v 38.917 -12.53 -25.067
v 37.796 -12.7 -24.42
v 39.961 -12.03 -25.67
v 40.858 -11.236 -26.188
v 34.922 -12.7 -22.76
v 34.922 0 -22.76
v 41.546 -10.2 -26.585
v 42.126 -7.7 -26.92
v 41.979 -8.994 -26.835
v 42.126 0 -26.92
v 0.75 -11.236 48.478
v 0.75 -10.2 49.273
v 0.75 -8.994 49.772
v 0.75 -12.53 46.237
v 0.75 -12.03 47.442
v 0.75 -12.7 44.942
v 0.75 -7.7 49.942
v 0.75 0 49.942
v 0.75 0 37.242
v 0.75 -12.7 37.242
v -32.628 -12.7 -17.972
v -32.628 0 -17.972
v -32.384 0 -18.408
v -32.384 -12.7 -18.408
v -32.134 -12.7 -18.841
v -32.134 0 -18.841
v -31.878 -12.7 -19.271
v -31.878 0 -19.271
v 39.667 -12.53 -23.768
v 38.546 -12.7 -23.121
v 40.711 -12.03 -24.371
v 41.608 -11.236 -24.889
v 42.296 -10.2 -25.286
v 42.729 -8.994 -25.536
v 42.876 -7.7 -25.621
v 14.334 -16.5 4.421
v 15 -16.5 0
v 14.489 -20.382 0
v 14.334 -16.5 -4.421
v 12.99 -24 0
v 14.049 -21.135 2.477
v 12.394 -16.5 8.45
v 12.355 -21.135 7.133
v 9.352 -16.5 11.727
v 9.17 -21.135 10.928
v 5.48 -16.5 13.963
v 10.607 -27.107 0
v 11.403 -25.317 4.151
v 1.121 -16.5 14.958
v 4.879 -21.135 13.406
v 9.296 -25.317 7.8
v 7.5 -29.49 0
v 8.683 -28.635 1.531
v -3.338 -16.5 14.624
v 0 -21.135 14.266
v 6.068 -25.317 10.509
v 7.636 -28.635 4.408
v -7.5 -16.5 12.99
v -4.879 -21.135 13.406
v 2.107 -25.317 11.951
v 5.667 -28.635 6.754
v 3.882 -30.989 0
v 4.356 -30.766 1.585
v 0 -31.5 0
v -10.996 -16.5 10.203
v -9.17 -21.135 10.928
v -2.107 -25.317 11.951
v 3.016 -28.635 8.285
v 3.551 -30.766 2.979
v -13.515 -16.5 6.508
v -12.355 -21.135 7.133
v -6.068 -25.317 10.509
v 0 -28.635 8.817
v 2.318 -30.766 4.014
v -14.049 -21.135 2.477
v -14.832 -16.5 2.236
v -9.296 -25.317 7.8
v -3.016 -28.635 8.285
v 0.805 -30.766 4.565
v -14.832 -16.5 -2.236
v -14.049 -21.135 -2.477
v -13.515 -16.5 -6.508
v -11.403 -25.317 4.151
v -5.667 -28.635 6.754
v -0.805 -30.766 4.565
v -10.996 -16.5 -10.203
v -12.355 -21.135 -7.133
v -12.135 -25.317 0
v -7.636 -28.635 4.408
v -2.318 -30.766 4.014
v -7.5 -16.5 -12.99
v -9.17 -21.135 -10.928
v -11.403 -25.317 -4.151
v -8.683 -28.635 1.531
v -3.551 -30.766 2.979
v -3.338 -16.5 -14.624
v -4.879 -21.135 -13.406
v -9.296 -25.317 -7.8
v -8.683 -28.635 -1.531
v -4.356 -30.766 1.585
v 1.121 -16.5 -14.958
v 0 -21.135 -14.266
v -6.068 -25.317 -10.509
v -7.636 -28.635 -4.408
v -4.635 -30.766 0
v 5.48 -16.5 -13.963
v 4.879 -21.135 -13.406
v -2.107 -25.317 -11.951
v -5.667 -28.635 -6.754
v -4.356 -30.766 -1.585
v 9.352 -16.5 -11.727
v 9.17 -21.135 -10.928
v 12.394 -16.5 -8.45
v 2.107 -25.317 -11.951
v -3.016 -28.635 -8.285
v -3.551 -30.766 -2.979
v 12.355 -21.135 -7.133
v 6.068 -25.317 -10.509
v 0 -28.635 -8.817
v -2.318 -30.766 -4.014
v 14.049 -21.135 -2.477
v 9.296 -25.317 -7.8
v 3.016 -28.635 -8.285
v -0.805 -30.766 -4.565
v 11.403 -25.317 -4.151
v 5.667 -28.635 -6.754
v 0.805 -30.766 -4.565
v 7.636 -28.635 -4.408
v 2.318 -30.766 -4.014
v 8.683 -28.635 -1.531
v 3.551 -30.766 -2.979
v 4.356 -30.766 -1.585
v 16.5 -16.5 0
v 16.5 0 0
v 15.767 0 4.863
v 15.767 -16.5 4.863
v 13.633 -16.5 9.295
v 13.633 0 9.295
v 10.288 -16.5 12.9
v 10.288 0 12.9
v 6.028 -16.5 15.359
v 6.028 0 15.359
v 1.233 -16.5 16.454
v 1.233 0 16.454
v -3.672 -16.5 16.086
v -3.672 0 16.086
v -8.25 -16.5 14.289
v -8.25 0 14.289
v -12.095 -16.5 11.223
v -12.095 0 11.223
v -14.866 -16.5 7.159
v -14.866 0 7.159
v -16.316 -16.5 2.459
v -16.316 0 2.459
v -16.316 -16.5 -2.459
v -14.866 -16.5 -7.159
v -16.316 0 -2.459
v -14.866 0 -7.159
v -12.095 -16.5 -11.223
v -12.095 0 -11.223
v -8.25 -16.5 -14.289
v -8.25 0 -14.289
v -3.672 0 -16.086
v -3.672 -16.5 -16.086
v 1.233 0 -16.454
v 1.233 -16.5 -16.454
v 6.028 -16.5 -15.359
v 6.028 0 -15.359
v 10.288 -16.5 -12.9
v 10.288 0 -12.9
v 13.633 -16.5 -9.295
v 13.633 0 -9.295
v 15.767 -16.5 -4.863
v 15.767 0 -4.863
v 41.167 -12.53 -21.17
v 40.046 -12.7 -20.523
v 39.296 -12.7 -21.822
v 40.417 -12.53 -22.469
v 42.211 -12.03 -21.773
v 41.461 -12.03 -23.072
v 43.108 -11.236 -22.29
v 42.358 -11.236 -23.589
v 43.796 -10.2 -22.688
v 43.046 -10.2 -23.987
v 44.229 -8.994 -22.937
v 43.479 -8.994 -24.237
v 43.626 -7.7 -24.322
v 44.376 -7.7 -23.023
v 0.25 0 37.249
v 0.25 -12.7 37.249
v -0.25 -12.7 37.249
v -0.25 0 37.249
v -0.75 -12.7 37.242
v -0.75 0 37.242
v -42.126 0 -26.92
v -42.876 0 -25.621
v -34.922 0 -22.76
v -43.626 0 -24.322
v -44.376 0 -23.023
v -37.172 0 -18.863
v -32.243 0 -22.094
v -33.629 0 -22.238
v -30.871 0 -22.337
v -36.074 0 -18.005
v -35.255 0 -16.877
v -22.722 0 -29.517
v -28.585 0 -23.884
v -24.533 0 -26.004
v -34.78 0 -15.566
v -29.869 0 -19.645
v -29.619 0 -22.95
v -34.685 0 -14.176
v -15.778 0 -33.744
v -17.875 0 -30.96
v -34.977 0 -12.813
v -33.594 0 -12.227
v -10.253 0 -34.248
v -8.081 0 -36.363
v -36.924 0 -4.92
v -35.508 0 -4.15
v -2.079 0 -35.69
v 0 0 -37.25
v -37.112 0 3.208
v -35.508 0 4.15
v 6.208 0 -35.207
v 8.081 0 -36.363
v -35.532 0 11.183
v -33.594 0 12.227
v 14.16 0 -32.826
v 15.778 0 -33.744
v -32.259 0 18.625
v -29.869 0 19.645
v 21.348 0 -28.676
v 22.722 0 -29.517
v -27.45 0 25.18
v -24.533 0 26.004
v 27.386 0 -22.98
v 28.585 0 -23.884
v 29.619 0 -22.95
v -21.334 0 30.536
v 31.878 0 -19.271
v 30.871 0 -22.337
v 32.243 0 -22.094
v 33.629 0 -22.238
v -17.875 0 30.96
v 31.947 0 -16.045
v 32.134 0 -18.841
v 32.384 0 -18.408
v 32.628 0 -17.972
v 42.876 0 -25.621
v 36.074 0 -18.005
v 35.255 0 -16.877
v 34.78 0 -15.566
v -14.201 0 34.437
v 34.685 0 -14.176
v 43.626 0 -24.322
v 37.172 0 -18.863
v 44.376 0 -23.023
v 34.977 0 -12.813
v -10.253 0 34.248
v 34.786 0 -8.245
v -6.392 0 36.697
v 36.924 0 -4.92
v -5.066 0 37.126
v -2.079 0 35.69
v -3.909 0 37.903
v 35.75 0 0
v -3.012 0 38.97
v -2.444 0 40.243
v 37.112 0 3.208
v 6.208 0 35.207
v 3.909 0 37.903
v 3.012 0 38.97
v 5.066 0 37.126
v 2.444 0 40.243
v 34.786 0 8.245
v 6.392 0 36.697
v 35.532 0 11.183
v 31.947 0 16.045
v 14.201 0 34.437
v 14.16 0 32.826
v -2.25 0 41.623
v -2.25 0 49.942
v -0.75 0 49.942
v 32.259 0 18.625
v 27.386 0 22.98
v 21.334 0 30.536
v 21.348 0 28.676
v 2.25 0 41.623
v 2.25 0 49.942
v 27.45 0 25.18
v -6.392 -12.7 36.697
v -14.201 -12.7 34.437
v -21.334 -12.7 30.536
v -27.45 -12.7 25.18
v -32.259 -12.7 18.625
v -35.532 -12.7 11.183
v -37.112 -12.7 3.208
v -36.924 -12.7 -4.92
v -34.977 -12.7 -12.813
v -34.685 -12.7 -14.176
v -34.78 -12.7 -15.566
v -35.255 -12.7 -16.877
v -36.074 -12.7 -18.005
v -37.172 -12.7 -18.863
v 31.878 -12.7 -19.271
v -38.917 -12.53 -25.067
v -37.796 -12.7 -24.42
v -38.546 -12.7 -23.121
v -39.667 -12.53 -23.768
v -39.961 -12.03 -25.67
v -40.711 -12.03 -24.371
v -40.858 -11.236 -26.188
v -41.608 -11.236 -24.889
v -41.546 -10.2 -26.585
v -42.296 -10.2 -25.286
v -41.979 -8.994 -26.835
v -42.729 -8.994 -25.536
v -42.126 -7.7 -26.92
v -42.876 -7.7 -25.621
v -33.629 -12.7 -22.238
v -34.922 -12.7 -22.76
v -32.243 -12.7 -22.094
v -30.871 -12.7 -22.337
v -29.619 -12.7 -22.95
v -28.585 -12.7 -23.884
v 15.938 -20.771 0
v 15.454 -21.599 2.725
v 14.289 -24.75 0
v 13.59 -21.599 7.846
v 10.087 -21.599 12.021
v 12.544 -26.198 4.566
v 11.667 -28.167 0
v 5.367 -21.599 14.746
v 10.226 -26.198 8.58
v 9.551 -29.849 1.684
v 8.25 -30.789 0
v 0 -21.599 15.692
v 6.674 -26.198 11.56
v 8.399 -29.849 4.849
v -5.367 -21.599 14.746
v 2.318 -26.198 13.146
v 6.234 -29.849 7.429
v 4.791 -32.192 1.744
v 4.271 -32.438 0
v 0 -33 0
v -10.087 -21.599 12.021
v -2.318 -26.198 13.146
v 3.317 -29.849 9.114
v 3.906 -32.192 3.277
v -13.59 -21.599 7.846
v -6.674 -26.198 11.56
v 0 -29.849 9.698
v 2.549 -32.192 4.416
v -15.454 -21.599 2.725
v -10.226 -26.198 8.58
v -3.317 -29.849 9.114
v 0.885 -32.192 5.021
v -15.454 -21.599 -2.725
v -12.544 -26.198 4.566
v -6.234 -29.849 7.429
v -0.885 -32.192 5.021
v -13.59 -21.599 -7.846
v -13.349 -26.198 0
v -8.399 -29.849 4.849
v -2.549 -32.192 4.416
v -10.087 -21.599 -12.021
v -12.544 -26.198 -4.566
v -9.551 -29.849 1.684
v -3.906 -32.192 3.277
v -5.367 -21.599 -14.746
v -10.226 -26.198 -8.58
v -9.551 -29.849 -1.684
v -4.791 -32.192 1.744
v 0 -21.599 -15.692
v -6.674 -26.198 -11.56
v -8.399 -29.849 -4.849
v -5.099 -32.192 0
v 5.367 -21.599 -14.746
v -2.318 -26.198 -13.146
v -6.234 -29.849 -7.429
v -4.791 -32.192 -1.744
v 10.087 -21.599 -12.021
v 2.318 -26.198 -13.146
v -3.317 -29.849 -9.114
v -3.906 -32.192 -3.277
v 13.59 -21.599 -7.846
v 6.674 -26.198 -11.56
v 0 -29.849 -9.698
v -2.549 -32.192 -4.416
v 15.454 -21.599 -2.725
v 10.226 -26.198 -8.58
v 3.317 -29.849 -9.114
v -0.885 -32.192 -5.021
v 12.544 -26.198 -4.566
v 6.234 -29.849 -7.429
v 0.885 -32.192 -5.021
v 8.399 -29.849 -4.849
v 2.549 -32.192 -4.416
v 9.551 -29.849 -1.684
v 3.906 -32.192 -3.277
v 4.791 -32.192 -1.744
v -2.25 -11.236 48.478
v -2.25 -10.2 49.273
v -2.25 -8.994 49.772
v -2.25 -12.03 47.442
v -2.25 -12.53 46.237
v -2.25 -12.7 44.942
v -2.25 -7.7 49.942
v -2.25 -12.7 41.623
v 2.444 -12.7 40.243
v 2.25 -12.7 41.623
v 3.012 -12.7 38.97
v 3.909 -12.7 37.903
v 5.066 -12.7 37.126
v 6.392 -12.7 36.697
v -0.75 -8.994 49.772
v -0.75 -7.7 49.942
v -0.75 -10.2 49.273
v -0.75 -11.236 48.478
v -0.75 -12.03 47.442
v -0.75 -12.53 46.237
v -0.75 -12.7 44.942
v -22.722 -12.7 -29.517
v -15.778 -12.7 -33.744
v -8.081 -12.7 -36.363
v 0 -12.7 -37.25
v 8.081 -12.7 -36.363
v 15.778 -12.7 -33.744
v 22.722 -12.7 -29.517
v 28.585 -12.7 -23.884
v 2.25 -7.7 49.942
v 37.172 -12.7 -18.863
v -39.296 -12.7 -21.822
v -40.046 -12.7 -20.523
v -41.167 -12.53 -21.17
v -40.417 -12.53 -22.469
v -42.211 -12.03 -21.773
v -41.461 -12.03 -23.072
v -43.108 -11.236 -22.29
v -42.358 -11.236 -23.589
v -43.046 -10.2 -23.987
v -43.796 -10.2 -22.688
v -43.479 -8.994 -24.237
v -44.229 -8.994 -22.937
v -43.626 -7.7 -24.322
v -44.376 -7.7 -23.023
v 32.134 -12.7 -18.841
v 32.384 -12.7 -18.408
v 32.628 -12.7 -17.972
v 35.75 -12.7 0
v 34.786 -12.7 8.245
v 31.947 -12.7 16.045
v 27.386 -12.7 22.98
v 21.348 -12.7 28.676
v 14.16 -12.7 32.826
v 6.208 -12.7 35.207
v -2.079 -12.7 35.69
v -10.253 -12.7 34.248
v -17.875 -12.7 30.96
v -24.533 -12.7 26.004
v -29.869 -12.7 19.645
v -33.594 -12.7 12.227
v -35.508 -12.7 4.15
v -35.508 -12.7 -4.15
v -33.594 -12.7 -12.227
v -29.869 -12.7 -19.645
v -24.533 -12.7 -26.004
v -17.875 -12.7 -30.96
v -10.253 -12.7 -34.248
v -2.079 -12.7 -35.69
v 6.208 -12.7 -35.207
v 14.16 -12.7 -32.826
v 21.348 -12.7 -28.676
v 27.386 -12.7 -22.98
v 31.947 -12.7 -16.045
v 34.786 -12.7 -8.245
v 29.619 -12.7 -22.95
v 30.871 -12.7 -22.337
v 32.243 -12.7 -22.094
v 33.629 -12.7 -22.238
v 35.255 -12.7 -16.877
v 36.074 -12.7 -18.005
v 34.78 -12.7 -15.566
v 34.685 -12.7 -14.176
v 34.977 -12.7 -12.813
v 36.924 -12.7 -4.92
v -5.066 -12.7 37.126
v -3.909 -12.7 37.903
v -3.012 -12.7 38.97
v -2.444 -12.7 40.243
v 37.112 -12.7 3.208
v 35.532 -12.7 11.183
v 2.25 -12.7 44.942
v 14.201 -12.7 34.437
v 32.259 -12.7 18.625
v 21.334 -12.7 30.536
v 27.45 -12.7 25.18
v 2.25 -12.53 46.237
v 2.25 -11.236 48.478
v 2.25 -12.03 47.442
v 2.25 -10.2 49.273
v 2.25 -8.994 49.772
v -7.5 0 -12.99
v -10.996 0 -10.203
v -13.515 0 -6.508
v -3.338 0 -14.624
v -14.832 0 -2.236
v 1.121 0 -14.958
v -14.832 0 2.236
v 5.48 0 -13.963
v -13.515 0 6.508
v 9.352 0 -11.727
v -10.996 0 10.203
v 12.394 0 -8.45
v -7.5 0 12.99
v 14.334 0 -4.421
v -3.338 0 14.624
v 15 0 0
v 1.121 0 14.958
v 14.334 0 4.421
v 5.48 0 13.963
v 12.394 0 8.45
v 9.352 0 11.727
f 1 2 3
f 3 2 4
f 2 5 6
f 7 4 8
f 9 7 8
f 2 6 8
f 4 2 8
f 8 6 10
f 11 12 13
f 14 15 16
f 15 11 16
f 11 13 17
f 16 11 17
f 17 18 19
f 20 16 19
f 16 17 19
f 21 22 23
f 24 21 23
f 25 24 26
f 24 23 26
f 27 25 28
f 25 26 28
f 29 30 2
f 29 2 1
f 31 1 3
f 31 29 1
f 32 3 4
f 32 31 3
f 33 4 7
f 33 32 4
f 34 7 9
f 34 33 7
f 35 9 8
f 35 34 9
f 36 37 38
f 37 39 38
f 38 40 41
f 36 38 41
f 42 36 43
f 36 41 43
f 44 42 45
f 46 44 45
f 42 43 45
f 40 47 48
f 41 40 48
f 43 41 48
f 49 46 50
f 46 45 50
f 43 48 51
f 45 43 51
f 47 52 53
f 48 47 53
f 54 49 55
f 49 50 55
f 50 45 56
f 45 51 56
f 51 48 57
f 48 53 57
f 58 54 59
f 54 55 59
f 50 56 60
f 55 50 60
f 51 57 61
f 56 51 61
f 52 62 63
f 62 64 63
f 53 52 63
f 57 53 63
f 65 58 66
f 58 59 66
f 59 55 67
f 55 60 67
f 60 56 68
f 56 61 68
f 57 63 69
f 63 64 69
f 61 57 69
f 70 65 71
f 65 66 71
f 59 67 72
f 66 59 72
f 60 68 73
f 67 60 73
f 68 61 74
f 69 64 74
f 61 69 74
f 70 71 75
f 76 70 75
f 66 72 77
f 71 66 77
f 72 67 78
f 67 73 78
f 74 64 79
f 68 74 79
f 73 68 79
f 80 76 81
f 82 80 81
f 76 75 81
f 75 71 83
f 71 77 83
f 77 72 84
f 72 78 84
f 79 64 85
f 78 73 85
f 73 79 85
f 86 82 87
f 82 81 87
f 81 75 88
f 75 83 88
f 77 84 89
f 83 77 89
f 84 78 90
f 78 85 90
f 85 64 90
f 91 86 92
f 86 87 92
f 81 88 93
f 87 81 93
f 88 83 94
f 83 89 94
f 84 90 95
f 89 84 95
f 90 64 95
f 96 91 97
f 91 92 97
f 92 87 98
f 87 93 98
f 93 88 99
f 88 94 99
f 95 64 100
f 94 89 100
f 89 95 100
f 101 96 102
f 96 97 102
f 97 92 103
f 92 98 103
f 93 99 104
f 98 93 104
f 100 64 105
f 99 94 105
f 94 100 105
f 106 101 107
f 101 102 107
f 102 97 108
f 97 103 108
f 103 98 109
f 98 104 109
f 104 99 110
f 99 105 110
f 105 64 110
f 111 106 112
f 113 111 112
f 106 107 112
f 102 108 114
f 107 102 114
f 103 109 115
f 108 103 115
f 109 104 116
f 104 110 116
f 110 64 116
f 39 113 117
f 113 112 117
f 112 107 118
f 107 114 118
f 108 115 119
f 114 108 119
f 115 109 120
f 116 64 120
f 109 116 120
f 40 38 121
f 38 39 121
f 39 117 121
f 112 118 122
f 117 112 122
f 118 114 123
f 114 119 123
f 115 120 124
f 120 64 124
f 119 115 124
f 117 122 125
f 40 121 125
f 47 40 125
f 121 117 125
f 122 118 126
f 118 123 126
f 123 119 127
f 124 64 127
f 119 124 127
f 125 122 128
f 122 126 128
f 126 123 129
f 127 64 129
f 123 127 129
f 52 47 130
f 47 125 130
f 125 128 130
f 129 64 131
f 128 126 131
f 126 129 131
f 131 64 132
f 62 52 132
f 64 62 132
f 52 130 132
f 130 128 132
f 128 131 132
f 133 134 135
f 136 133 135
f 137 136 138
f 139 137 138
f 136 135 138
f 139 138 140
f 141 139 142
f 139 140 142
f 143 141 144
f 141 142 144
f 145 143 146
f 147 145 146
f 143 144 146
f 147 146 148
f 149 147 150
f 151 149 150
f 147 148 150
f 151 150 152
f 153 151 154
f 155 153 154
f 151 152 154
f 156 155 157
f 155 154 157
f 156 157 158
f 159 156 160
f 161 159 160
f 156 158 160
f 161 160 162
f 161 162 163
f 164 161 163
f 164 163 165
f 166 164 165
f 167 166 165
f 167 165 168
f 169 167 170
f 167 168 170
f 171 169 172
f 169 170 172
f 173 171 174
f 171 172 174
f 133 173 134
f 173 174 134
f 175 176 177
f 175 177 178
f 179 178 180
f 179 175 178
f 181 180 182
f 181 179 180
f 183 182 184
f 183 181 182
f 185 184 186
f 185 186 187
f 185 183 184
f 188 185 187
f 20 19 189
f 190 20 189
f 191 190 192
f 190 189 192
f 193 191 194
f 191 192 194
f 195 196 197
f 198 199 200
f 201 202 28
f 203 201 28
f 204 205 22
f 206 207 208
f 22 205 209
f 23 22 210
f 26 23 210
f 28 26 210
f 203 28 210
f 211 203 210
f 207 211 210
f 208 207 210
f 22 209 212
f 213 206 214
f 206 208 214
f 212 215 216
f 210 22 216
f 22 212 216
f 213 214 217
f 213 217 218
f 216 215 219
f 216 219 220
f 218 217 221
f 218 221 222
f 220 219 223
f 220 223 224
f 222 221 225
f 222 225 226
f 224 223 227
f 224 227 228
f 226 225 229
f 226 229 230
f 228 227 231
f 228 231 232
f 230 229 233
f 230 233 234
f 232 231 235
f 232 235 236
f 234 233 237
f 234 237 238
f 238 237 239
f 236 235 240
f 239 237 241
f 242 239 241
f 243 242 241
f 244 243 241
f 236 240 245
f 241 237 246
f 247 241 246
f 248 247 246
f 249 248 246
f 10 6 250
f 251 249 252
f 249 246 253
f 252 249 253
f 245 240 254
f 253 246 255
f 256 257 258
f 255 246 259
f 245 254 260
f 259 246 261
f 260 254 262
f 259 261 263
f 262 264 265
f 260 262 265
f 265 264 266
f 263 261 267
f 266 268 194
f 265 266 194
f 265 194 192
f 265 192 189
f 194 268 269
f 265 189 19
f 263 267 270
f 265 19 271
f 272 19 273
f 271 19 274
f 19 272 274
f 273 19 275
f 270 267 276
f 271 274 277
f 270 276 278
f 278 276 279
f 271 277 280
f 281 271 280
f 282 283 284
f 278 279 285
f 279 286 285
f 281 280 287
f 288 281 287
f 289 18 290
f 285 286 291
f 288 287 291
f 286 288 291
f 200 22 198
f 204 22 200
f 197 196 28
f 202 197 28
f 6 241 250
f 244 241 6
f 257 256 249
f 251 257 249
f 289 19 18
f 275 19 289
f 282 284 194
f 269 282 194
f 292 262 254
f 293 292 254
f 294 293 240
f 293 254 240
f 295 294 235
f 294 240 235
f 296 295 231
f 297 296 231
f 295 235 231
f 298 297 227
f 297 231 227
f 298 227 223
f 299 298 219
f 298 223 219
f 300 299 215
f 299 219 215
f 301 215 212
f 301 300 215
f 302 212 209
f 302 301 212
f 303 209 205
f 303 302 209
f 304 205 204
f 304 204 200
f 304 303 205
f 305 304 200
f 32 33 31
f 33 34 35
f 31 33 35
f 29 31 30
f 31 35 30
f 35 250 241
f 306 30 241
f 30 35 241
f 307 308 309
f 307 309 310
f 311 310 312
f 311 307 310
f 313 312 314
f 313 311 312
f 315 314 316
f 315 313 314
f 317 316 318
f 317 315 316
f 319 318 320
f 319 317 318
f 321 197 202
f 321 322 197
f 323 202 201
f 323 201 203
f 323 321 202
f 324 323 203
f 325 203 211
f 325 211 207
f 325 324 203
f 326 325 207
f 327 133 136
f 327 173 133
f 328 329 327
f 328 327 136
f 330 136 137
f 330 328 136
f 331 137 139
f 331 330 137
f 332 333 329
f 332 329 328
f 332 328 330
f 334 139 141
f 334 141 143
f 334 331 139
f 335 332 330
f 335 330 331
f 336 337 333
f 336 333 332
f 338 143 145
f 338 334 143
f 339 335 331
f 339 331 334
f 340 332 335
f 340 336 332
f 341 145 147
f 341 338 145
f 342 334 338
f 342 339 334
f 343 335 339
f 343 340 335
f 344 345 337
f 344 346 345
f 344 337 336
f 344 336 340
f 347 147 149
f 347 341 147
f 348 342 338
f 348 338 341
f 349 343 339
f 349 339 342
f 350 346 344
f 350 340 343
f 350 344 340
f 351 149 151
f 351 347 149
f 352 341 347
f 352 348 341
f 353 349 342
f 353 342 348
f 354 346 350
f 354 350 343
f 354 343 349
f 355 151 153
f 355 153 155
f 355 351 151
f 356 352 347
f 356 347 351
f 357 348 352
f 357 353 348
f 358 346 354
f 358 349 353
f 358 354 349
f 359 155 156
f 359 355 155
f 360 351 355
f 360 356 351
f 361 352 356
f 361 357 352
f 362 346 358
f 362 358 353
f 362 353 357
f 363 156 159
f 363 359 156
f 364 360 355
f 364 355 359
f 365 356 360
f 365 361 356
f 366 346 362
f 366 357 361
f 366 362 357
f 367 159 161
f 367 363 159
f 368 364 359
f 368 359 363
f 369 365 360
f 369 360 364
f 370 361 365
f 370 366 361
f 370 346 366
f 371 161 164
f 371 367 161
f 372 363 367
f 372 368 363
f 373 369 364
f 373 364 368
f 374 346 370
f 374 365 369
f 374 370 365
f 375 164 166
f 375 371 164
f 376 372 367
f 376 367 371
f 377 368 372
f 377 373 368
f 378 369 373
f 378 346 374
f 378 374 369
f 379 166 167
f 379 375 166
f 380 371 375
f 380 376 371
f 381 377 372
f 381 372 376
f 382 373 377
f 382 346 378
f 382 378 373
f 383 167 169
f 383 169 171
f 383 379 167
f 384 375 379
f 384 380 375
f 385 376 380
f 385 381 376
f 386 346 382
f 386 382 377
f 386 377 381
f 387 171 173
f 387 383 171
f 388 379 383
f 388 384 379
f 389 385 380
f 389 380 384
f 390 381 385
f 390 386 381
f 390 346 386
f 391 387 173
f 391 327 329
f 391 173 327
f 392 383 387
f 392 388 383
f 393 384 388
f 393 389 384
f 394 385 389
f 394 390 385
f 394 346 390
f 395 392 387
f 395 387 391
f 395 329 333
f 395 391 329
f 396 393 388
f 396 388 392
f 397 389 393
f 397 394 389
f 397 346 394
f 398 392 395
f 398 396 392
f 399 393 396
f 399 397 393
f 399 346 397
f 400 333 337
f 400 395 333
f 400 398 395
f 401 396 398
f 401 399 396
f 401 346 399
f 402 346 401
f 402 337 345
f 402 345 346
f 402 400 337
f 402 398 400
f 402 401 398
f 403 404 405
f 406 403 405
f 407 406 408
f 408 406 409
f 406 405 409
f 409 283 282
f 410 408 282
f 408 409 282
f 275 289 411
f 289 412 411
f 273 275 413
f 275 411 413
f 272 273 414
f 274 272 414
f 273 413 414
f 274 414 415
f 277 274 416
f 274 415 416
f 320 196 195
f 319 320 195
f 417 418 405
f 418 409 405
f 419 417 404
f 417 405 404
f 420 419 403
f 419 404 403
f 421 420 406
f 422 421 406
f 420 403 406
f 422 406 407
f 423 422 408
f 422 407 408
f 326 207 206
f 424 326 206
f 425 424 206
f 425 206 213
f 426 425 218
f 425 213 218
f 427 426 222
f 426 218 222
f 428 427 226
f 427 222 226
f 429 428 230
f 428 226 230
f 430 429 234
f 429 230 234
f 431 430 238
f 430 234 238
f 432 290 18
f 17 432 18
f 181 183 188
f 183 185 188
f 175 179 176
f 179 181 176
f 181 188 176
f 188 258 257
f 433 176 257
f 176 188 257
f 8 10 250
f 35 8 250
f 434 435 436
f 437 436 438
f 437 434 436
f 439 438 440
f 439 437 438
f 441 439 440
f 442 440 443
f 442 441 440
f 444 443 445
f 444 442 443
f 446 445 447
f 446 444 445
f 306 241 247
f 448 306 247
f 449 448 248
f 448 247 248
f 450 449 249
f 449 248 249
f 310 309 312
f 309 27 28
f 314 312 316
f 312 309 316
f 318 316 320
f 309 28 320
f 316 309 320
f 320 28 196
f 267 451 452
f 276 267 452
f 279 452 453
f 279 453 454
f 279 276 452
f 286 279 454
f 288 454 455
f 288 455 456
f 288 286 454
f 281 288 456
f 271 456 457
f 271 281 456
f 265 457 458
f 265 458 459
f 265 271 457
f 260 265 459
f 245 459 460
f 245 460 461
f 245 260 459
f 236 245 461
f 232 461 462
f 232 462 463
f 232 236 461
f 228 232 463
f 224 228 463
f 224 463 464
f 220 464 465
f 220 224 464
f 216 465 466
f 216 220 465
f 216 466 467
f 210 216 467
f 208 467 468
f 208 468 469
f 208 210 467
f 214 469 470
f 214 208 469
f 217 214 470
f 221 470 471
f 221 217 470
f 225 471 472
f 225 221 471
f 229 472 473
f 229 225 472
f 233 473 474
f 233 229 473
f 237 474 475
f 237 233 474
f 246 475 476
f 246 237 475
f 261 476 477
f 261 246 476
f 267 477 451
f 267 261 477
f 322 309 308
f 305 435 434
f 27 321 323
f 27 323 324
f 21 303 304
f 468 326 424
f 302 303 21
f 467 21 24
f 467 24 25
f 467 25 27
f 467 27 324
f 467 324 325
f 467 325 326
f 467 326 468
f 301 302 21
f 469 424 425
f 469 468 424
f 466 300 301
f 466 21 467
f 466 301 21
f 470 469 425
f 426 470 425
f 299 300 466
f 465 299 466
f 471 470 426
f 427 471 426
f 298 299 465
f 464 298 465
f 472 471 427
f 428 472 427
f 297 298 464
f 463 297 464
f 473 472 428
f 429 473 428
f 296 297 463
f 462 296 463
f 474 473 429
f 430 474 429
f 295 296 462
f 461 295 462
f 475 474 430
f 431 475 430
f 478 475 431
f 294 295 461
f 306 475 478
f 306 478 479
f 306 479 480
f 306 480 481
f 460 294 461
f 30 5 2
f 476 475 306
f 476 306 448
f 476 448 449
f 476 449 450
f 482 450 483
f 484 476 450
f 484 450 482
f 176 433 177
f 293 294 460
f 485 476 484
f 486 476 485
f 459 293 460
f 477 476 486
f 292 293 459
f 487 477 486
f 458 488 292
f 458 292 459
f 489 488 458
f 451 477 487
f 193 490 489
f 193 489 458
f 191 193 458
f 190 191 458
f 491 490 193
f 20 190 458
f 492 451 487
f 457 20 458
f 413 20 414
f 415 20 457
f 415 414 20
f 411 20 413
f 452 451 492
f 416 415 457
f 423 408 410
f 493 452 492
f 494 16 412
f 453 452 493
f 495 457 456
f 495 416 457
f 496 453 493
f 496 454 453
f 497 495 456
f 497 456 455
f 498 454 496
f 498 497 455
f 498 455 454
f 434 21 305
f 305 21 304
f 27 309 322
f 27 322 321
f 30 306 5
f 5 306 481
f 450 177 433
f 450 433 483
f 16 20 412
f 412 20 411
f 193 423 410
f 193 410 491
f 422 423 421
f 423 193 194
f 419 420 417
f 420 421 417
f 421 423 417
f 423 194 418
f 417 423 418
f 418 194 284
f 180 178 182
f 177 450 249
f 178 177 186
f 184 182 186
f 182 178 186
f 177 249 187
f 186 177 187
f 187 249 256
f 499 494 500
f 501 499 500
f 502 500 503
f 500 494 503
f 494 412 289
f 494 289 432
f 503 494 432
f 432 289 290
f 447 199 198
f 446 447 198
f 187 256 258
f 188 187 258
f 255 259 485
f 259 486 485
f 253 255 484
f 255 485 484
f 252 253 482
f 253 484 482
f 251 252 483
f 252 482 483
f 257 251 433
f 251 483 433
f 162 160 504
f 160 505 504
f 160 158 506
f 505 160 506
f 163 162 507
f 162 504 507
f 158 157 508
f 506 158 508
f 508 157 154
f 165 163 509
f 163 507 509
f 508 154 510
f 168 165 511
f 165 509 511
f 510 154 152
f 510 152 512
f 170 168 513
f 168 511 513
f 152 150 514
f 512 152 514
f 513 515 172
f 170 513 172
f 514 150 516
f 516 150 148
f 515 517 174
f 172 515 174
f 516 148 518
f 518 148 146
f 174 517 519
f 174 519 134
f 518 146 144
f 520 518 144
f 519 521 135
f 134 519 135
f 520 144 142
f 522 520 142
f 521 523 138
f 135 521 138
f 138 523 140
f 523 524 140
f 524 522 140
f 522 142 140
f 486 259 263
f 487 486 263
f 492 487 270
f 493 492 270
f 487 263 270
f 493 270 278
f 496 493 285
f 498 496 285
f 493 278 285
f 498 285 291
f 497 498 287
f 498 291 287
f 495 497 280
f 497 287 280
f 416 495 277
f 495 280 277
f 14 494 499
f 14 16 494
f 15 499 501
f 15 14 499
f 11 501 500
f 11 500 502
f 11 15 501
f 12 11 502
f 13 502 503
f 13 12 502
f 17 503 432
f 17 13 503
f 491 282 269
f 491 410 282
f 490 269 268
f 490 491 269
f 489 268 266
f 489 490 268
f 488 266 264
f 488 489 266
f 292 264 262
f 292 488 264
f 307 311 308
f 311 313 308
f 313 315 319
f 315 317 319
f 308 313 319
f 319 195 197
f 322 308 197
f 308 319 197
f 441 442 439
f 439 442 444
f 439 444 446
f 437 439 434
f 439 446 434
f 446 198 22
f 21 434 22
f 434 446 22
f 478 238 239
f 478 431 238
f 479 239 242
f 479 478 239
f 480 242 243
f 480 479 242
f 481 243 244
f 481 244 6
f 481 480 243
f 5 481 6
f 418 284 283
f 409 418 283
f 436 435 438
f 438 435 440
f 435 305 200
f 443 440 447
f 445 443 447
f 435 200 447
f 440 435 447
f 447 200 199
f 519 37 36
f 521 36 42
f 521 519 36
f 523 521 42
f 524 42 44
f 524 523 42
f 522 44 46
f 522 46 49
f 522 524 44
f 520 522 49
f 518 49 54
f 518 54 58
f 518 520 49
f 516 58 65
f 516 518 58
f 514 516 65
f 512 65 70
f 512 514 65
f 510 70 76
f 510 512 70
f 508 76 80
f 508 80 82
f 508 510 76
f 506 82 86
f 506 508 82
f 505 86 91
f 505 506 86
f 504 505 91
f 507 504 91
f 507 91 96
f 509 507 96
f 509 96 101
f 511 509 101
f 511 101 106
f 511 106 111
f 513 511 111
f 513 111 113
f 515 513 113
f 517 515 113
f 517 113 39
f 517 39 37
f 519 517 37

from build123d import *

# Parameters (mm, degrees)
F0_R     = 35.75
F1_DEPTH = 12.7
F2_R     = 5
F3_R     = 5
F4_R     = 16.5
F5_DEPTH = 33
F6_R     = 16.5
F7_T     = -1.5


with BuildPart() as f1:
    # F0 (on Front) → F1 (new body)
    with BuildSketch(Plane.XZ):
        with BuildLine():
            Line((-2.25, 49.942449), (-2.25, 37.181985))
            ThreePointArc((-2.25, 37.181985), (-32.259446, 18.625), (-33.325543, -16.642435))
            Line((-33.325543, -16.642435), (-44.376429, -23.022667))
            Line((-44.376429, -23.022667), (-43.626429, -24.321705))
            Line((-43.626429, -24.321705), (-32.627907, -17.971705))
            ThreePointArc((-32.627907, -17.971705), (-32.259446, -18.625), (-31.877907, -19.270744))
            Line((-31.877907, -19.270744), (-42.876429, -25.620744))
            Line((-42.876429, -25.620744), (-42.126429, -26.919782))
            Line((-42.126429, -26.919782), (-31.075543, -20.53955))
            ThreePointArc((-31.075543, -20.53955), (0, -37.25), (31.075543, -20.53955))
            Line((31.075543, -20.53955), (42.126429, -26.919782))
            Line((42.126429, -26.919782), (42.876429, -25.620744))
            Line((42.876429, -25.620744), (31.877907, -19.270744))
            ThreePointArc((31.877907, -19.270744), (32.259446, -18.625), (32.627907, -17.971705))
            Line((32.627907, -17.971705), (43.626429, -24.321705))
            Line((43.626429, -24.321705), (44.376429, -23.022667))
            Line((44.376429, -23.022667), (33.325543, -16.642435))
            ThreePointArc((33.325543, -16.642435), (32.259446, 18.625), (2.25, 37.181985))
            Line((2.25, 37.181985), (2.25, 49.942449))
            Line((2.25, 49.942449), (0.75, 49.942449))
            Line((0.75, 49.942449), (0.75, 37.242449))
            ThreePointArc((0.75, 37.242449), (0, 37.25), (-0.75, 37.242449))
            Line((-0.75, 37.242449), (-0.75, 49.942449))
            Line((-0.75, 49.942449), (-2.25, 49.942449))
        make_face()
        Circle(F0_R, mode=Mode.SUBTRACT)
    extrude(amount=F1_DEPTH)

    # F2
    f2_edges = [f1.edges().sort_by_distance(p)[0] for p in [
        (31.075543, -6.35, -20.53955),
        (-31.075543, -6.35, -20.53955),
        (-33.325543, -6.35, -16.642435),
        (-2.25, -6.35, 37.181985),
        (2.25, -6.35, 37.181985),
        (33.325543, -6.35, -16.642435),
    ]]
    fillet(f2_edges, radius=F2_R)

    # F3
    f3_edges = [f1.edges().sort_by_distance(p)[0] for p in [
        (44.001429, -12.7, -23.672186),
        (42.501429, -12.7, -26.270263),
        (-42.501429, -12.7, -26.270263),
        (-44.001429, -12.7, -23.672186),
        (-1.5, -12.7, 49.942449),
        (1.5, -12.7, 49.942449),
    ]]
    fillet(f3_edges, radius=F3_R)


with BuildPart() as f5:
    # F4 (on Front) → F5 (new body)
    with BuildSketch(Plane.XZ):
        Circle(F4_R)
    extrude(amount=F5_DEPTH)

    # F6
    f6_edges = [f5.edges().sort_by_distance(p)[0] for p in [
        (-16.5, -33, 0),
    ]]
    fillet(f6_edges, radius=F6_R)

    # F7
    f7_openings = [f5.faces().sort_by_distance(p)[0] for p in [
        (0, 0, 0),
    ]]
    offset(amount=F7_T, openings=f7_openings)


solid = Compound([f1.part, f5.part])
